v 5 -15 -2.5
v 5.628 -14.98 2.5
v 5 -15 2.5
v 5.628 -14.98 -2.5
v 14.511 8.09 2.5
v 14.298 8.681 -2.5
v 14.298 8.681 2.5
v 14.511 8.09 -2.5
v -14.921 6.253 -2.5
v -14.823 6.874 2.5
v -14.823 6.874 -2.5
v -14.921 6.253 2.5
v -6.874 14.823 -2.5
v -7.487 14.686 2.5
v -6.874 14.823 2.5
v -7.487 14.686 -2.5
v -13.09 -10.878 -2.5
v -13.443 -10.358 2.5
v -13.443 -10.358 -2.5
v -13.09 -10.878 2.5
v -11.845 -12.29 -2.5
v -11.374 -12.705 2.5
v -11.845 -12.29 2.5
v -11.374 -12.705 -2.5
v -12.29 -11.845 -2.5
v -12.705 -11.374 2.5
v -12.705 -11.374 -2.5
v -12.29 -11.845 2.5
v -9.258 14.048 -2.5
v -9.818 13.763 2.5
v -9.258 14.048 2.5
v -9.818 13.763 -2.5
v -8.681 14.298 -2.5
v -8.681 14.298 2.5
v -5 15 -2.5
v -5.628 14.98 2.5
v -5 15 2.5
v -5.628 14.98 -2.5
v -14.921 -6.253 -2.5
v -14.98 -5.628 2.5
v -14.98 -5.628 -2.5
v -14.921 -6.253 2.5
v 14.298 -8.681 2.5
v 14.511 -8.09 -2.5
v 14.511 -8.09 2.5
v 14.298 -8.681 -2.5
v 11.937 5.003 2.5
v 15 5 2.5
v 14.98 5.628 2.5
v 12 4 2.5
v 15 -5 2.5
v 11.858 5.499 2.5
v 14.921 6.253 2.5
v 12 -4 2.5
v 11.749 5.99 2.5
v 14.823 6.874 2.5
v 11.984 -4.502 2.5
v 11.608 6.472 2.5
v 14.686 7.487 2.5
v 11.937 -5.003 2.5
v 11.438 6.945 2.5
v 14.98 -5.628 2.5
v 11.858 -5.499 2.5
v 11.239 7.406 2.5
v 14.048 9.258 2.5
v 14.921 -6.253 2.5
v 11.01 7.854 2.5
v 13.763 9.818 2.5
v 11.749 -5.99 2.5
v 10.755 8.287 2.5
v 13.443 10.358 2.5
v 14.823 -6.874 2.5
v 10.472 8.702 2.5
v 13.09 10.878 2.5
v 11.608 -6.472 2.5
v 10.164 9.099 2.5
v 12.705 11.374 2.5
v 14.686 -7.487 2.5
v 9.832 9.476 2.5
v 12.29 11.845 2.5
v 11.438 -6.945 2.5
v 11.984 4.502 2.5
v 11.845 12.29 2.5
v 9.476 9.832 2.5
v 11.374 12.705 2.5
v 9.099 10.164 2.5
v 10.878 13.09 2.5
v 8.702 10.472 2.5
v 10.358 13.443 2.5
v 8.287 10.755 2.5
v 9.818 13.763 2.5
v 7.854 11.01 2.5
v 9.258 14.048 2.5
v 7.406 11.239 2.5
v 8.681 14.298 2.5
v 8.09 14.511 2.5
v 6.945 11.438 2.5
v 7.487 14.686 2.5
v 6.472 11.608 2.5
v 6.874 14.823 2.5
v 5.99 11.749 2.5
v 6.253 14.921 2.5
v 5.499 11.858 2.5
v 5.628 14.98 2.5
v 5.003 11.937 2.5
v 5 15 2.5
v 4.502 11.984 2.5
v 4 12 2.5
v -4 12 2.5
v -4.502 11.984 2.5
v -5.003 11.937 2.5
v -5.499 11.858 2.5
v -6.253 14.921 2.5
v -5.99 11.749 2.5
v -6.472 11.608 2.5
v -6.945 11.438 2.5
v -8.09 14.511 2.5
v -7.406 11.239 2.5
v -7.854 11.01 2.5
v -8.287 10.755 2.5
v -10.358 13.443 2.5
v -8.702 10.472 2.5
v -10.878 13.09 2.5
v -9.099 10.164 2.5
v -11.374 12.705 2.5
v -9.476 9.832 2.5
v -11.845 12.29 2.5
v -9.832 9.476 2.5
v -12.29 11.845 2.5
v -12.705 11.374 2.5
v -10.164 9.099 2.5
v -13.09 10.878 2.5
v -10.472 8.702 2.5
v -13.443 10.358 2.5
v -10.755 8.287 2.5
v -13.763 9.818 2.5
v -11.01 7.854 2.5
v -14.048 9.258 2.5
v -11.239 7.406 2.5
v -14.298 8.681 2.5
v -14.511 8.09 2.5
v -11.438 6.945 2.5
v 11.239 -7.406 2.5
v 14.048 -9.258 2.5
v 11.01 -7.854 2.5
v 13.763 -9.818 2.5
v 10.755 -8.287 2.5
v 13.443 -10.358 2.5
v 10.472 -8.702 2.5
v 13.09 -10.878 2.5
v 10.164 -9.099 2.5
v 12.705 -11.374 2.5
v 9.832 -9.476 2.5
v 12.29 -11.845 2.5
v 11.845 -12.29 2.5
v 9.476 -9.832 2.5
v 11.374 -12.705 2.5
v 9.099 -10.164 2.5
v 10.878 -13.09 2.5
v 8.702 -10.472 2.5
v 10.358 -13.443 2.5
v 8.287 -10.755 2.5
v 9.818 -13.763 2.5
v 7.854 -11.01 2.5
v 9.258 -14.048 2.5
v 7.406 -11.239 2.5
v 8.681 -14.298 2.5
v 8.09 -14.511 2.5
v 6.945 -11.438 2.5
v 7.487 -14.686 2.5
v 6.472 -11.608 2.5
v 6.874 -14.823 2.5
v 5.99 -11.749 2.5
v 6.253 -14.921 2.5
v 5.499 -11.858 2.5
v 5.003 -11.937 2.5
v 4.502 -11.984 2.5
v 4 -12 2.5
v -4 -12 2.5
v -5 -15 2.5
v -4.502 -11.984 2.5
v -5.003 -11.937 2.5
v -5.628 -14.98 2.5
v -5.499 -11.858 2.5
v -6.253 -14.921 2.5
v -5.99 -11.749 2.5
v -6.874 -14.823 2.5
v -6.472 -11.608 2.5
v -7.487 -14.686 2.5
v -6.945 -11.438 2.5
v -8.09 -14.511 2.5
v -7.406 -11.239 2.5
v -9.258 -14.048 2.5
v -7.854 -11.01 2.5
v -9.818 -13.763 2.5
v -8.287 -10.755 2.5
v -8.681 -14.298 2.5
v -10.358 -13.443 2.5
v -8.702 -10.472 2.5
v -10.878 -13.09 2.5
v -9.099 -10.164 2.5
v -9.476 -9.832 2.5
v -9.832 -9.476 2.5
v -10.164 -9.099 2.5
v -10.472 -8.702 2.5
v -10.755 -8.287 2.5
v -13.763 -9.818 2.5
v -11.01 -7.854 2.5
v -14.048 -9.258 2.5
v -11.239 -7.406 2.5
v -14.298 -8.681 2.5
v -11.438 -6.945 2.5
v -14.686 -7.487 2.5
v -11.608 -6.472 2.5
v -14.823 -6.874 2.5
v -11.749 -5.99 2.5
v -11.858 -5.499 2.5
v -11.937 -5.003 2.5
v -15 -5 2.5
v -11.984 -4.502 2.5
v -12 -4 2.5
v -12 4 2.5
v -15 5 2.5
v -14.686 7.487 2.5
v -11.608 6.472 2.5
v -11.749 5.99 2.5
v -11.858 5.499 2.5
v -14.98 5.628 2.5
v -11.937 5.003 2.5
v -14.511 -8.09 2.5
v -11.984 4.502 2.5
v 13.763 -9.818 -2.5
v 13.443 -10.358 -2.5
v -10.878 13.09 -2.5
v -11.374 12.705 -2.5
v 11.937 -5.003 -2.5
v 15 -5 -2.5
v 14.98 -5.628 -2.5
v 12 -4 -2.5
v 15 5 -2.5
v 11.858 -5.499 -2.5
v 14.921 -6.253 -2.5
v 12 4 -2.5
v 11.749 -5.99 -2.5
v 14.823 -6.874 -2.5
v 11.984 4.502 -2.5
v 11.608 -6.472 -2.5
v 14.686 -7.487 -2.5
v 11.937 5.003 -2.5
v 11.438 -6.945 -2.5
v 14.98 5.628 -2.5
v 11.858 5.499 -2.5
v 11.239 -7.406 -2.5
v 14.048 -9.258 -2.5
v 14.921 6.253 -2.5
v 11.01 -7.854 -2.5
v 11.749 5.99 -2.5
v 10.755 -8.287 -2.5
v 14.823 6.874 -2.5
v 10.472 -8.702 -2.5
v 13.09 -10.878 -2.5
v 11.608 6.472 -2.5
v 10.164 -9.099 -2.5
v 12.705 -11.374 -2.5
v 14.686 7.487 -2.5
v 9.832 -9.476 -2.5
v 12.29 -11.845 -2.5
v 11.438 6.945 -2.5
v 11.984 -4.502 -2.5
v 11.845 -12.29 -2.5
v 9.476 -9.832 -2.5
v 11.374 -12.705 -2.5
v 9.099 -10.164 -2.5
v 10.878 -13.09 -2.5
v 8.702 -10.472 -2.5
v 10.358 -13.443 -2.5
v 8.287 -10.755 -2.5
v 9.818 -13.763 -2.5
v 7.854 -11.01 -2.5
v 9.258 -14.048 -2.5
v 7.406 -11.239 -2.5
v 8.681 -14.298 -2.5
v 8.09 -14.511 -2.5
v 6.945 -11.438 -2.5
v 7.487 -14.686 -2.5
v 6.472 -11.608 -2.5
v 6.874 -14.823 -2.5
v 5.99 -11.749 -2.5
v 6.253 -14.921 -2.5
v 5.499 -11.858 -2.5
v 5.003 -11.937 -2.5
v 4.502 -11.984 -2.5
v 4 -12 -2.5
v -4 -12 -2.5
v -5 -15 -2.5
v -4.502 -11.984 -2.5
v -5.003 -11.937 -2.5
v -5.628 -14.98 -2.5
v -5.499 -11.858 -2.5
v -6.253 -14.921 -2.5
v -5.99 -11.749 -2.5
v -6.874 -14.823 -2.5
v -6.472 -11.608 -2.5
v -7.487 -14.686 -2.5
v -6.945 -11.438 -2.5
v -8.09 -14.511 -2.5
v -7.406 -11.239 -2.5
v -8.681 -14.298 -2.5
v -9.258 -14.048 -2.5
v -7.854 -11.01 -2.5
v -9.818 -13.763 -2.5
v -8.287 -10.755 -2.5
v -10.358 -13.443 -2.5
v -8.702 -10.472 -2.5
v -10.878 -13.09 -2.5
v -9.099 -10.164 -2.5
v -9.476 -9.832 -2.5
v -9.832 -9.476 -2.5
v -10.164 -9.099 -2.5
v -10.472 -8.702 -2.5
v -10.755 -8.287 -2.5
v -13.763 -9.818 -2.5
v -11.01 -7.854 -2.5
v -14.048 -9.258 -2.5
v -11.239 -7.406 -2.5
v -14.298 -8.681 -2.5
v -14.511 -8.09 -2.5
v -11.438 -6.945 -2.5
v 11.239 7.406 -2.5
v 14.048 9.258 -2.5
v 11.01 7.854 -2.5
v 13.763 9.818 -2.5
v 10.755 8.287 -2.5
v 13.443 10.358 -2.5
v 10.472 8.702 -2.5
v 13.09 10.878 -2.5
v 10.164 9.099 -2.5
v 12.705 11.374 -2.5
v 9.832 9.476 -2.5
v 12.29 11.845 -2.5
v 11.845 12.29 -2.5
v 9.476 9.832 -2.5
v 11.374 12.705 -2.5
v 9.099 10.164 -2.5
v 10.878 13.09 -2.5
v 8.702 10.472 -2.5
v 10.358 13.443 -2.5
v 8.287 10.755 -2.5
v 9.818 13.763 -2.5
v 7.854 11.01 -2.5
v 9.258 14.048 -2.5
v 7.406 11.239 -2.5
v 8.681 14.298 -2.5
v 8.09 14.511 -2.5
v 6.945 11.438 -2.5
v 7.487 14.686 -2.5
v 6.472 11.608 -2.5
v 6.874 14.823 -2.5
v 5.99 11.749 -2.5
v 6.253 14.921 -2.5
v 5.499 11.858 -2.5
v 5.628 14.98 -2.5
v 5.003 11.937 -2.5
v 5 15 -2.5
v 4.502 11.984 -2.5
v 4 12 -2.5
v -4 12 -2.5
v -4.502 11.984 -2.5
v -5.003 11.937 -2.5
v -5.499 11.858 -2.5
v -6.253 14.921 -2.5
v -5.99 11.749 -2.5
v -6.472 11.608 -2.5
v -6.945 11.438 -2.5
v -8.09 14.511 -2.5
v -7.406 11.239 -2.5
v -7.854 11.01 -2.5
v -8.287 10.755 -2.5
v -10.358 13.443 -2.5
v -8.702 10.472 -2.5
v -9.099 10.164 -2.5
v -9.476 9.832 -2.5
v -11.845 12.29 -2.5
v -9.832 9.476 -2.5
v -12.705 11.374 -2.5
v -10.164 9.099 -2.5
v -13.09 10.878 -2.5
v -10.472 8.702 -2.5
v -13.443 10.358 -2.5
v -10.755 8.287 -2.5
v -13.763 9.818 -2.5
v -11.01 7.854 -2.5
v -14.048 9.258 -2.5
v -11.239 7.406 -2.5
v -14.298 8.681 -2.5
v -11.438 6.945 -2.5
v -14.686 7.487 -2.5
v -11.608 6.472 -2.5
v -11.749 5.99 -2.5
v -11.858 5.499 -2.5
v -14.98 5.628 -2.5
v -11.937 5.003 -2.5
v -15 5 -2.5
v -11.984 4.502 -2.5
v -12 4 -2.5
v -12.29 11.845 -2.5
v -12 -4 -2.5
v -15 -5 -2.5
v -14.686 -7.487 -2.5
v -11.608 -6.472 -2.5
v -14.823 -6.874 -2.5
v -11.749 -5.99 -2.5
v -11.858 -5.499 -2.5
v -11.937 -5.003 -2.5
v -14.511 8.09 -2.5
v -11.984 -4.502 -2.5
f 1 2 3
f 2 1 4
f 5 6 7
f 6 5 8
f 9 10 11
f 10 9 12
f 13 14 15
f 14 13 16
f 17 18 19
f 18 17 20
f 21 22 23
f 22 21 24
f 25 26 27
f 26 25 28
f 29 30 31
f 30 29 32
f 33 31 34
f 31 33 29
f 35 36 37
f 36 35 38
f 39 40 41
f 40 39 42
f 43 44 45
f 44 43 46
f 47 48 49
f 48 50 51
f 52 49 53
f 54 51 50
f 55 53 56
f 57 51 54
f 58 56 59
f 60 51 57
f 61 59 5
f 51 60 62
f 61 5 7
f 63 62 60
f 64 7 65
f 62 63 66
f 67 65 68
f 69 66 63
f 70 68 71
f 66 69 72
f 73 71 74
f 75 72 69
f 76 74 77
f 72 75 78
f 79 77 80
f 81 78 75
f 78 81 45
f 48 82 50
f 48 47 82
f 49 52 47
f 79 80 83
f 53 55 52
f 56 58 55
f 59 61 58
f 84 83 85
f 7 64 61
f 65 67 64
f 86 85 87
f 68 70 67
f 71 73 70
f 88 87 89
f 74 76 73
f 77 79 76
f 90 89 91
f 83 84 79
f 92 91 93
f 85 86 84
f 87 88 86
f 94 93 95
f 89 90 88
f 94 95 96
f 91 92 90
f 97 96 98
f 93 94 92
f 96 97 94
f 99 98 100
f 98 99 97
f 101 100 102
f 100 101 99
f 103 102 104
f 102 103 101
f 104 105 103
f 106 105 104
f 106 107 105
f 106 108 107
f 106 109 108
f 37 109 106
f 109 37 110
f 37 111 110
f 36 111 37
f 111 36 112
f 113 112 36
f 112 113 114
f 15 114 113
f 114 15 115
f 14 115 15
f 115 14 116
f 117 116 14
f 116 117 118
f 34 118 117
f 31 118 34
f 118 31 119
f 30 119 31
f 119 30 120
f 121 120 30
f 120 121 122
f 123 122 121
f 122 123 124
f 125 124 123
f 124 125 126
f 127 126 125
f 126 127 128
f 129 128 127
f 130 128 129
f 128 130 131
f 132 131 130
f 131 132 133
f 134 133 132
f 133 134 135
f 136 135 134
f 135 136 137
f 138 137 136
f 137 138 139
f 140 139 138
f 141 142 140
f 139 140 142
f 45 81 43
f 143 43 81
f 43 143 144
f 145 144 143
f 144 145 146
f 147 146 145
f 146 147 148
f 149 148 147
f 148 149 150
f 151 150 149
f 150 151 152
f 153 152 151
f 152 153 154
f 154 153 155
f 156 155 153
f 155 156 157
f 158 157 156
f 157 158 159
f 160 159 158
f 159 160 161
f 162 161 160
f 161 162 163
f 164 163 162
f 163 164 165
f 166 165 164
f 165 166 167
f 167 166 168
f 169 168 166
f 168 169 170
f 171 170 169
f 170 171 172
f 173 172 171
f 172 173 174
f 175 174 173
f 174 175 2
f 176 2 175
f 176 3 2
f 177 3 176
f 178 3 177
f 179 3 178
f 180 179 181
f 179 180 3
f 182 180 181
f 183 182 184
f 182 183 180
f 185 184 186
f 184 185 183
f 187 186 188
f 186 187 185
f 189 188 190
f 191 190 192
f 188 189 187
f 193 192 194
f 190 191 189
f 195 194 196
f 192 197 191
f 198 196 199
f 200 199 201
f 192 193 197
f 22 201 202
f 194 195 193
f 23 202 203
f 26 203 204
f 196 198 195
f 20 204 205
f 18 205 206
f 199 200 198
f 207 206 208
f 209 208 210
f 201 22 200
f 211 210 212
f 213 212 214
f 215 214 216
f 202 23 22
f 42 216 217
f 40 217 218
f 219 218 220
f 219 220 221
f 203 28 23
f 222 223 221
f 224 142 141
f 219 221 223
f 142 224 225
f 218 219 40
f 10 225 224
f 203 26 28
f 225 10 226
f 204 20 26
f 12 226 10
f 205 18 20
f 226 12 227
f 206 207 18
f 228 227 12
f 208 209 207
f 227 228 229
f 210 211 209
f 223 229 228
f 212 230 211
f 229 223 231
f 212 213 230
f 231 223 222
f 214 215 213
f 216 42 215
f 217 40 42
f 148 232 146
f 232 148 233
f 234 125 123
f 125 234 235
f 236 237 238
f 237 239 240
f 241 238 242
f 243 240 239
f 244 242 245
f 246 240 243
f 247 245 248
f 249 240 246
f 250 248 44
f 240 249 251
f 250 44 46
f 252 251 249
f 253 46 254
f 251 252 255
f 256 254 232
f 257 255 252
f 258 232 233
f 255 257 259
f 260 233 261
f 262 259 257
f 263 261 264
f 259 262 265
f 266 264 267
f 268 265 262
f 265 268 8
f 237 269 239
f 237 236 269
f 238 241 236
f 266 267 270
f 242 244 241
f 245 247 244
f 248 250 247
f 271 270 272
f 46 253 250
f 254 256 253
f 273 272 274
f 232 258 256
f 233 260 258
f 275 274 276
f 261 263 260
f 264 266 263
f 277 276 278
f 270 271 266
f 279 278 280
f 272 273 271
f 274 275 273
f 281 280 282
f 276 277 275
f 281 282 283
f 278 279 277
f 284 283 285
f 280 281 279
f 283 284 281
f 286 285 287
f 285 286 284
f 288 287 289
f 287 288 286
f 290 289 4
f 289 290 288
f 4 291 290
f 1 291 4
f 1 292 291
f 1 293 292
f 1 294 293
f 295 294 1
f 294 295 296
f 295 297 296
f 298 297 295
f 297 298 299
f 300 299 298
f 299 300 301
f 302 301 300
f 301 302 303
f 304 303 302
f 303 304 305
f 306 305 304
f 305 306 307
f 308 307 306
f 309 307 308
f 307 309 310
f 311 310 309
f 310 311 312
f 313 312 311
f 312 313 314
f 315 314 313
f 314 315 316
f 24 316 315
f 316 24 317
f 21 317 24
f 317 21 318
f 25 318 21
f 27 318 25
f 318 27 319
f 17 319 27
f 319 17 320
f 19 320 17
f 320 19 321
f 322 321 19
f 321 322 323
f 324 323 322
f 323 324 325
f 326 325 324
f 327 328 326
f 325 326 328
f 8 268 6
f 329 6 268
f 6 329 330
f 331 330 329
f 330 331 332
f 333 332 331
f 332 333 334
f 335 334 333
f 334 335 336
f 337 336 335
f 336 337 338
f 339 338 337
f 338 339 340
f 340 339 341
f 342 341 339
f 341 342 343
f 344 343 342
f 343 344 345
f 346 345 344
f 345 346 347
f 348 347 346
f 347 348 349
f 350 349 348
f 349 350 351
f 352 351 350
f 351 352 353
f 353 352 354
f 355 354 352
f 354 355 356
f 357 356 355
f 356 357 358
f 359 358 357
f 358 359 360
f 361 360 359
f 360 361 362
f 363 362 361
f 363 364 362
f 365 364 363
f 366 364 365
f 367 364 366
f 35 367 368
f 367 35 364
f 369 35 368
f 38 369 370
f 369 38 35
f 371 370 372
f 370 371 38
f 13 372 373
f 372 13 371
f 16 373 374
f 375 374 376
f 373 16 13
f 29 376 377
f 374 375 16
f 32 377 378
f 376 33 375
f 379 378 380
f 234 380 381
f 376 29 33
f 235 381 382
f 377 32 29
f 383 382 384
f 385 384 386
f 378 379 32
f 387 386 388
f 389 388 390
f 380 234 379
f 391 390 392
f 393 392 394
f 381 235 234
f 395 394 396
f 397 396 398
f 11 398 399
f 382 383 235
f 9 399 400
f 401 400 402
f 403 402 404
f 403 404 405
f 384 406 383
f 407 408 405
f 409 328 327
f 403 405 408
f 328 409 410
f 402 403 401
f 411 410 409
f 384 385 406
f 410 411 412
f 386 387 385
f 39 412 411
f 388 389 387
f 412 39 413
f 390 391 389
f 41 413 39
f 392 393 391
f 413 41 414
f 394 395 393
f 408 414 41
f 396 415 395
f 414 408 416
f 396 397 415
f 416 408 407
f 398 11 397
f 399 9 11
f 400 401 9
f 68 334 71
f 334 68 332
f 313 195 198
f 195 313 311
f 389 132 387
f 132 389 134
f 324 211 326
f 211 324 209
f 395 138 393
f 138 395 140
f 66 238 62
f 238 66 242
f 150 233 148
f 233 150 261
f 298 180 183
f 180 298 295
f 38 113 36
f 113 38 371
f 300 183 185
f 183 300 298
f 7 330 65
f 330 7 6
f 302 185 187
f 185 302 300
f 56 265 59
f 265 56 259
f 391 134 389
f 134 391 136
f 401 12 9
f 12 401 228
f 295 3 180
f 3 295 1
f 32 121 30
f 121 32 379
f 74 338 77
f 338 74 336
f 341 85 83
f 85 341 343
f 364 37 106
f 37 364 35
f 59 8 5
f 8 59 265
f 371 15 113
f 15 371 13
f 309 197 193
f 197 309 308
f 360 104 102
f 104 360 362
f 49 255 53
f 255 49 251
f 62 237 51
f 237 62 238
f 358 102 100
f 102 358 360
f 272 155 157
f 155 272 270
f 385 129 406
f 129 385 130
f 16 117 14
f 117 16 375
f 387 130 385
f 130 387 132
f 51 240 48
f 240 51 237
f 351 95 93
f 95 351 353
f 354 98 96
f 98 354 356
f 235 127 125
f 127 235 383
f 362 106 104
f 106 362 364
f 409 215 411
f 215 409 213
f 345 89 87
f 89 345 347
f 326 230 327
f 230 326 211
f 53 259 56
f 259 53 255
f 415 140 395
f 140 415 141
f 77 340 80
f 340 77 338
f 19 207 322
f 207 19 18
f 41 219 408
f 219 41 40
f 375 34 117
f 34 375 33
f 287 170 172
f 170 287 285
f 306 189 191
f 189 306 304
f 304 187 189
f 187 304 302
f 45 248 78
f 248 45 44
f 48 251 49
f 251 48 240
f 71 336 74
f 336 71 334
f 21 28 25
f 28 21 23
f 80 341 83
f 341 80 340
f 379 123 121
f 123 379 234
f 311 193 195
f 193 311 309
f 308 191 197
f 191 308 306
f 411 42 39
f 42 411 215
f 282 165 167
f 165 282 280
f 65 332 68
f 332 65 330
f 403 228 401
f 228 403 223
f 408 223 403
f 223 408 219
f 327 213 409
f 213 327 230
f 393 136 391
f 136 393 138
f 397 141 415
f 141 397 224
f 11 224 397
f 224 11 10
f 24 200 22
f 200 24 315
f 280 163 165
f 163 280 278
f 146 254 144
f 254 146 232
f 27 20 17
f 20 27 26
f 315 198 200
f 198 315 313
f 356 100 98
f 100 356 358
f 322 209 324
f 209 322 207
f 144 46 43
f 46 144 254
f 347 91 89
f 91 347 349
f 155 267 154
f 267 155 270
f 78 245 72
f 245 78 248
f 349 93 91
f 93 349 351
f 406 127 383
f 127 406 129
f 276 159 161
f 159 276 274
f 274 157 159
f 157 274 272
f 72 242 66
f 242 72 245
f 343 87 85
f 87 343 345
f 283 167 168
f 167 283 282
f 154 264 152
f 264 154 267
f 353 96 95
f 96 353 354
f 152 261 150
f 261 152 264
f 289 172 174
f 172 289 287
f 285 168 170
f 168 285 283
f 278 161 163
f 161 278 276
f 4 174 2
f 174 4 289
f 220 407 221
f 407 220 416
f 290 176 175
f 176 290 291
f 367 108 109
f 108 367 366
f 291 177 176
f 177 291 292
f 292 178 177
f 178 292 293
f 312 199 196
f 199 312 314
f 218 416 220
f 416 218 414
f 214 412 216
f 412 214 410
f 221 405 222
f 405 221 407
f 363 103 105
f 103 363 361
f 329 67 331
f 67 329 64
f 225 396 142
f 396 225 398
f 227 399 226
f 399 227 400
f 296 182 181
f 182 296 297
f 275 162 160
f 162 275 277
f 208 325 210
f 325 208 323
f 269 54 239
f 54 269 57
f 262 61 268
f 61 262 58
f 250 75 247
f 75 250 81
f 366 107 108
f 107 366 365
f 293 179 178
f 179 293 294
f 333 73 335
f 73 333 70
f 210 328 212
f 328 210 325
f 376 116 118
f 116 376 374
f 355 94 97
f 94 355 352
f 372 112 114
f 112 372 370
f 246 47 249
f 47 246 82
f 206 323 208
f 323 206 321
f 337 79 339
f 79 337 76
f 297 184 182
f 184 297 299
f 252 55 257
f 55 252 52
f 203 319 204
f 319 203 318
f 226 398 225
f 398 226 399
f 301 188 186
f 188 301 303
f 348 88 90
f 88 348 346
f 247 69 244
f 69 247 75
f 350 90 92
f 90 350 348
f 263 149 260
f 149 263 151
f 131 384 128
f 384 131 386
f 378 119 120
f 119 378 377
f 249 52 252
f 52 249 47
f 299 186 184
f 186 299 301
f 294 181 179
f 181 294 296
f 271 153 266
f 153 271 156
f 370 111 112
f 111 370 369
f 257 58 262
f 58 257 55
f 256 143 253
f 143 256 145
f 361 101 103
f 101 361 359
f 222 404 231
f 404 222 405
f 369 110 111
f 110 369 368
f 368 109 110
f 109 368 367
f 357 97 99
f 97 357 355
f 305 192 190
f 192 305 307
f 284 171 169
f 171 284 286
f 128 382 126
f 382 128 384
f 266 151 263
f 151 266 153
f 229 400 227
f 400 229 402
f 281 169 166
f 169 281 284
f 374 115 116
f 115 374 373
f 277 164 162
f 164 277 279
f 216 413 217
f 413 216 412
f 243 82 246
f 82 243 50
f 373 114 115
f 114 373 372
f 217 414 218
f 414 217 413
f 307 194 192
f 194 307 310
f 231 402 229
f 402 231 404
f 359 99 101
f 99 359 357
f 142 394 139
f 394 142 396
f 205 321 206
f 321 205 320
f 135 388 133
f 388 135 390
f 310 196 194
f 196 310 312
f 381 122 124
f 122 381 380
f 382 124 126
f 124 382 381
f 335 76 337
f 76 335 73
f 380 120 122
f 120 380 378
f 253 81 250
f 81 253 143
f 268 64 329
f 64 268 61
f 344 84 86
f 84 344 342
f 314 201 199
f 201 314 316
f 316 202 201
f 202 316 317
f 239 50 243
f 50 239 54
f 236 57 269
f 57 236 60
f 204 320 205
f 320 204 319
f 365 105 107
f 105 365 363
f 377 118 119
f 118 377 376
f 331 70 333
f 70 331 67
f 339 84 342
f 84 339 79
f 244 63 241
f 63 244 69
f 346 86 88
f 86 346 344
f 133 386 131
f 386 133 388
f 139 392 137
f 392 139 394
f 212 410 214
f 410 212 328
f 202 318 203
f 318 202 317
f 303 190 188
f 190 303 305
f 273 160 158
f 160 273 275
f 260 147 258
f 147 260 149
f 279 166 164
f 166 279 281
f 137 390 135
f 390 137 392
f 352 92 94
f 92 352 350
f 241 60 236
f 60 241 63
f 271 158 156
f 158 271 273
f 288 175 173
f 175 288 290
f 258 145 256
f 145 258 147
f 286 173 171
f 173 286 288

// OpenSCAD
//Customization Project

//INSTRUCTIONS: save as scad, press f6, save as stl, upload to thingiverse, customize there.

//What should the outer square side length be?
l=10;//[0:.5:50]

//What should the height be?
h=5;//[0:.5:50]

//What should the thickness be?
t=2;//[0:.5:50]

module Outersquare()
{
offset(l)
square(size=l,center=true);
}

module Innersquare()
{   
offset(l-t)
square(size=(l-t),center=true);  
}

difference()
{
    linear_extrude(height=h,center=true,$fn=100)
    {
    Outersquare();
    }
    linear_extrude(height=(h+1),center=true,$fn=100)
    {
    Innersquare();
    }
}
